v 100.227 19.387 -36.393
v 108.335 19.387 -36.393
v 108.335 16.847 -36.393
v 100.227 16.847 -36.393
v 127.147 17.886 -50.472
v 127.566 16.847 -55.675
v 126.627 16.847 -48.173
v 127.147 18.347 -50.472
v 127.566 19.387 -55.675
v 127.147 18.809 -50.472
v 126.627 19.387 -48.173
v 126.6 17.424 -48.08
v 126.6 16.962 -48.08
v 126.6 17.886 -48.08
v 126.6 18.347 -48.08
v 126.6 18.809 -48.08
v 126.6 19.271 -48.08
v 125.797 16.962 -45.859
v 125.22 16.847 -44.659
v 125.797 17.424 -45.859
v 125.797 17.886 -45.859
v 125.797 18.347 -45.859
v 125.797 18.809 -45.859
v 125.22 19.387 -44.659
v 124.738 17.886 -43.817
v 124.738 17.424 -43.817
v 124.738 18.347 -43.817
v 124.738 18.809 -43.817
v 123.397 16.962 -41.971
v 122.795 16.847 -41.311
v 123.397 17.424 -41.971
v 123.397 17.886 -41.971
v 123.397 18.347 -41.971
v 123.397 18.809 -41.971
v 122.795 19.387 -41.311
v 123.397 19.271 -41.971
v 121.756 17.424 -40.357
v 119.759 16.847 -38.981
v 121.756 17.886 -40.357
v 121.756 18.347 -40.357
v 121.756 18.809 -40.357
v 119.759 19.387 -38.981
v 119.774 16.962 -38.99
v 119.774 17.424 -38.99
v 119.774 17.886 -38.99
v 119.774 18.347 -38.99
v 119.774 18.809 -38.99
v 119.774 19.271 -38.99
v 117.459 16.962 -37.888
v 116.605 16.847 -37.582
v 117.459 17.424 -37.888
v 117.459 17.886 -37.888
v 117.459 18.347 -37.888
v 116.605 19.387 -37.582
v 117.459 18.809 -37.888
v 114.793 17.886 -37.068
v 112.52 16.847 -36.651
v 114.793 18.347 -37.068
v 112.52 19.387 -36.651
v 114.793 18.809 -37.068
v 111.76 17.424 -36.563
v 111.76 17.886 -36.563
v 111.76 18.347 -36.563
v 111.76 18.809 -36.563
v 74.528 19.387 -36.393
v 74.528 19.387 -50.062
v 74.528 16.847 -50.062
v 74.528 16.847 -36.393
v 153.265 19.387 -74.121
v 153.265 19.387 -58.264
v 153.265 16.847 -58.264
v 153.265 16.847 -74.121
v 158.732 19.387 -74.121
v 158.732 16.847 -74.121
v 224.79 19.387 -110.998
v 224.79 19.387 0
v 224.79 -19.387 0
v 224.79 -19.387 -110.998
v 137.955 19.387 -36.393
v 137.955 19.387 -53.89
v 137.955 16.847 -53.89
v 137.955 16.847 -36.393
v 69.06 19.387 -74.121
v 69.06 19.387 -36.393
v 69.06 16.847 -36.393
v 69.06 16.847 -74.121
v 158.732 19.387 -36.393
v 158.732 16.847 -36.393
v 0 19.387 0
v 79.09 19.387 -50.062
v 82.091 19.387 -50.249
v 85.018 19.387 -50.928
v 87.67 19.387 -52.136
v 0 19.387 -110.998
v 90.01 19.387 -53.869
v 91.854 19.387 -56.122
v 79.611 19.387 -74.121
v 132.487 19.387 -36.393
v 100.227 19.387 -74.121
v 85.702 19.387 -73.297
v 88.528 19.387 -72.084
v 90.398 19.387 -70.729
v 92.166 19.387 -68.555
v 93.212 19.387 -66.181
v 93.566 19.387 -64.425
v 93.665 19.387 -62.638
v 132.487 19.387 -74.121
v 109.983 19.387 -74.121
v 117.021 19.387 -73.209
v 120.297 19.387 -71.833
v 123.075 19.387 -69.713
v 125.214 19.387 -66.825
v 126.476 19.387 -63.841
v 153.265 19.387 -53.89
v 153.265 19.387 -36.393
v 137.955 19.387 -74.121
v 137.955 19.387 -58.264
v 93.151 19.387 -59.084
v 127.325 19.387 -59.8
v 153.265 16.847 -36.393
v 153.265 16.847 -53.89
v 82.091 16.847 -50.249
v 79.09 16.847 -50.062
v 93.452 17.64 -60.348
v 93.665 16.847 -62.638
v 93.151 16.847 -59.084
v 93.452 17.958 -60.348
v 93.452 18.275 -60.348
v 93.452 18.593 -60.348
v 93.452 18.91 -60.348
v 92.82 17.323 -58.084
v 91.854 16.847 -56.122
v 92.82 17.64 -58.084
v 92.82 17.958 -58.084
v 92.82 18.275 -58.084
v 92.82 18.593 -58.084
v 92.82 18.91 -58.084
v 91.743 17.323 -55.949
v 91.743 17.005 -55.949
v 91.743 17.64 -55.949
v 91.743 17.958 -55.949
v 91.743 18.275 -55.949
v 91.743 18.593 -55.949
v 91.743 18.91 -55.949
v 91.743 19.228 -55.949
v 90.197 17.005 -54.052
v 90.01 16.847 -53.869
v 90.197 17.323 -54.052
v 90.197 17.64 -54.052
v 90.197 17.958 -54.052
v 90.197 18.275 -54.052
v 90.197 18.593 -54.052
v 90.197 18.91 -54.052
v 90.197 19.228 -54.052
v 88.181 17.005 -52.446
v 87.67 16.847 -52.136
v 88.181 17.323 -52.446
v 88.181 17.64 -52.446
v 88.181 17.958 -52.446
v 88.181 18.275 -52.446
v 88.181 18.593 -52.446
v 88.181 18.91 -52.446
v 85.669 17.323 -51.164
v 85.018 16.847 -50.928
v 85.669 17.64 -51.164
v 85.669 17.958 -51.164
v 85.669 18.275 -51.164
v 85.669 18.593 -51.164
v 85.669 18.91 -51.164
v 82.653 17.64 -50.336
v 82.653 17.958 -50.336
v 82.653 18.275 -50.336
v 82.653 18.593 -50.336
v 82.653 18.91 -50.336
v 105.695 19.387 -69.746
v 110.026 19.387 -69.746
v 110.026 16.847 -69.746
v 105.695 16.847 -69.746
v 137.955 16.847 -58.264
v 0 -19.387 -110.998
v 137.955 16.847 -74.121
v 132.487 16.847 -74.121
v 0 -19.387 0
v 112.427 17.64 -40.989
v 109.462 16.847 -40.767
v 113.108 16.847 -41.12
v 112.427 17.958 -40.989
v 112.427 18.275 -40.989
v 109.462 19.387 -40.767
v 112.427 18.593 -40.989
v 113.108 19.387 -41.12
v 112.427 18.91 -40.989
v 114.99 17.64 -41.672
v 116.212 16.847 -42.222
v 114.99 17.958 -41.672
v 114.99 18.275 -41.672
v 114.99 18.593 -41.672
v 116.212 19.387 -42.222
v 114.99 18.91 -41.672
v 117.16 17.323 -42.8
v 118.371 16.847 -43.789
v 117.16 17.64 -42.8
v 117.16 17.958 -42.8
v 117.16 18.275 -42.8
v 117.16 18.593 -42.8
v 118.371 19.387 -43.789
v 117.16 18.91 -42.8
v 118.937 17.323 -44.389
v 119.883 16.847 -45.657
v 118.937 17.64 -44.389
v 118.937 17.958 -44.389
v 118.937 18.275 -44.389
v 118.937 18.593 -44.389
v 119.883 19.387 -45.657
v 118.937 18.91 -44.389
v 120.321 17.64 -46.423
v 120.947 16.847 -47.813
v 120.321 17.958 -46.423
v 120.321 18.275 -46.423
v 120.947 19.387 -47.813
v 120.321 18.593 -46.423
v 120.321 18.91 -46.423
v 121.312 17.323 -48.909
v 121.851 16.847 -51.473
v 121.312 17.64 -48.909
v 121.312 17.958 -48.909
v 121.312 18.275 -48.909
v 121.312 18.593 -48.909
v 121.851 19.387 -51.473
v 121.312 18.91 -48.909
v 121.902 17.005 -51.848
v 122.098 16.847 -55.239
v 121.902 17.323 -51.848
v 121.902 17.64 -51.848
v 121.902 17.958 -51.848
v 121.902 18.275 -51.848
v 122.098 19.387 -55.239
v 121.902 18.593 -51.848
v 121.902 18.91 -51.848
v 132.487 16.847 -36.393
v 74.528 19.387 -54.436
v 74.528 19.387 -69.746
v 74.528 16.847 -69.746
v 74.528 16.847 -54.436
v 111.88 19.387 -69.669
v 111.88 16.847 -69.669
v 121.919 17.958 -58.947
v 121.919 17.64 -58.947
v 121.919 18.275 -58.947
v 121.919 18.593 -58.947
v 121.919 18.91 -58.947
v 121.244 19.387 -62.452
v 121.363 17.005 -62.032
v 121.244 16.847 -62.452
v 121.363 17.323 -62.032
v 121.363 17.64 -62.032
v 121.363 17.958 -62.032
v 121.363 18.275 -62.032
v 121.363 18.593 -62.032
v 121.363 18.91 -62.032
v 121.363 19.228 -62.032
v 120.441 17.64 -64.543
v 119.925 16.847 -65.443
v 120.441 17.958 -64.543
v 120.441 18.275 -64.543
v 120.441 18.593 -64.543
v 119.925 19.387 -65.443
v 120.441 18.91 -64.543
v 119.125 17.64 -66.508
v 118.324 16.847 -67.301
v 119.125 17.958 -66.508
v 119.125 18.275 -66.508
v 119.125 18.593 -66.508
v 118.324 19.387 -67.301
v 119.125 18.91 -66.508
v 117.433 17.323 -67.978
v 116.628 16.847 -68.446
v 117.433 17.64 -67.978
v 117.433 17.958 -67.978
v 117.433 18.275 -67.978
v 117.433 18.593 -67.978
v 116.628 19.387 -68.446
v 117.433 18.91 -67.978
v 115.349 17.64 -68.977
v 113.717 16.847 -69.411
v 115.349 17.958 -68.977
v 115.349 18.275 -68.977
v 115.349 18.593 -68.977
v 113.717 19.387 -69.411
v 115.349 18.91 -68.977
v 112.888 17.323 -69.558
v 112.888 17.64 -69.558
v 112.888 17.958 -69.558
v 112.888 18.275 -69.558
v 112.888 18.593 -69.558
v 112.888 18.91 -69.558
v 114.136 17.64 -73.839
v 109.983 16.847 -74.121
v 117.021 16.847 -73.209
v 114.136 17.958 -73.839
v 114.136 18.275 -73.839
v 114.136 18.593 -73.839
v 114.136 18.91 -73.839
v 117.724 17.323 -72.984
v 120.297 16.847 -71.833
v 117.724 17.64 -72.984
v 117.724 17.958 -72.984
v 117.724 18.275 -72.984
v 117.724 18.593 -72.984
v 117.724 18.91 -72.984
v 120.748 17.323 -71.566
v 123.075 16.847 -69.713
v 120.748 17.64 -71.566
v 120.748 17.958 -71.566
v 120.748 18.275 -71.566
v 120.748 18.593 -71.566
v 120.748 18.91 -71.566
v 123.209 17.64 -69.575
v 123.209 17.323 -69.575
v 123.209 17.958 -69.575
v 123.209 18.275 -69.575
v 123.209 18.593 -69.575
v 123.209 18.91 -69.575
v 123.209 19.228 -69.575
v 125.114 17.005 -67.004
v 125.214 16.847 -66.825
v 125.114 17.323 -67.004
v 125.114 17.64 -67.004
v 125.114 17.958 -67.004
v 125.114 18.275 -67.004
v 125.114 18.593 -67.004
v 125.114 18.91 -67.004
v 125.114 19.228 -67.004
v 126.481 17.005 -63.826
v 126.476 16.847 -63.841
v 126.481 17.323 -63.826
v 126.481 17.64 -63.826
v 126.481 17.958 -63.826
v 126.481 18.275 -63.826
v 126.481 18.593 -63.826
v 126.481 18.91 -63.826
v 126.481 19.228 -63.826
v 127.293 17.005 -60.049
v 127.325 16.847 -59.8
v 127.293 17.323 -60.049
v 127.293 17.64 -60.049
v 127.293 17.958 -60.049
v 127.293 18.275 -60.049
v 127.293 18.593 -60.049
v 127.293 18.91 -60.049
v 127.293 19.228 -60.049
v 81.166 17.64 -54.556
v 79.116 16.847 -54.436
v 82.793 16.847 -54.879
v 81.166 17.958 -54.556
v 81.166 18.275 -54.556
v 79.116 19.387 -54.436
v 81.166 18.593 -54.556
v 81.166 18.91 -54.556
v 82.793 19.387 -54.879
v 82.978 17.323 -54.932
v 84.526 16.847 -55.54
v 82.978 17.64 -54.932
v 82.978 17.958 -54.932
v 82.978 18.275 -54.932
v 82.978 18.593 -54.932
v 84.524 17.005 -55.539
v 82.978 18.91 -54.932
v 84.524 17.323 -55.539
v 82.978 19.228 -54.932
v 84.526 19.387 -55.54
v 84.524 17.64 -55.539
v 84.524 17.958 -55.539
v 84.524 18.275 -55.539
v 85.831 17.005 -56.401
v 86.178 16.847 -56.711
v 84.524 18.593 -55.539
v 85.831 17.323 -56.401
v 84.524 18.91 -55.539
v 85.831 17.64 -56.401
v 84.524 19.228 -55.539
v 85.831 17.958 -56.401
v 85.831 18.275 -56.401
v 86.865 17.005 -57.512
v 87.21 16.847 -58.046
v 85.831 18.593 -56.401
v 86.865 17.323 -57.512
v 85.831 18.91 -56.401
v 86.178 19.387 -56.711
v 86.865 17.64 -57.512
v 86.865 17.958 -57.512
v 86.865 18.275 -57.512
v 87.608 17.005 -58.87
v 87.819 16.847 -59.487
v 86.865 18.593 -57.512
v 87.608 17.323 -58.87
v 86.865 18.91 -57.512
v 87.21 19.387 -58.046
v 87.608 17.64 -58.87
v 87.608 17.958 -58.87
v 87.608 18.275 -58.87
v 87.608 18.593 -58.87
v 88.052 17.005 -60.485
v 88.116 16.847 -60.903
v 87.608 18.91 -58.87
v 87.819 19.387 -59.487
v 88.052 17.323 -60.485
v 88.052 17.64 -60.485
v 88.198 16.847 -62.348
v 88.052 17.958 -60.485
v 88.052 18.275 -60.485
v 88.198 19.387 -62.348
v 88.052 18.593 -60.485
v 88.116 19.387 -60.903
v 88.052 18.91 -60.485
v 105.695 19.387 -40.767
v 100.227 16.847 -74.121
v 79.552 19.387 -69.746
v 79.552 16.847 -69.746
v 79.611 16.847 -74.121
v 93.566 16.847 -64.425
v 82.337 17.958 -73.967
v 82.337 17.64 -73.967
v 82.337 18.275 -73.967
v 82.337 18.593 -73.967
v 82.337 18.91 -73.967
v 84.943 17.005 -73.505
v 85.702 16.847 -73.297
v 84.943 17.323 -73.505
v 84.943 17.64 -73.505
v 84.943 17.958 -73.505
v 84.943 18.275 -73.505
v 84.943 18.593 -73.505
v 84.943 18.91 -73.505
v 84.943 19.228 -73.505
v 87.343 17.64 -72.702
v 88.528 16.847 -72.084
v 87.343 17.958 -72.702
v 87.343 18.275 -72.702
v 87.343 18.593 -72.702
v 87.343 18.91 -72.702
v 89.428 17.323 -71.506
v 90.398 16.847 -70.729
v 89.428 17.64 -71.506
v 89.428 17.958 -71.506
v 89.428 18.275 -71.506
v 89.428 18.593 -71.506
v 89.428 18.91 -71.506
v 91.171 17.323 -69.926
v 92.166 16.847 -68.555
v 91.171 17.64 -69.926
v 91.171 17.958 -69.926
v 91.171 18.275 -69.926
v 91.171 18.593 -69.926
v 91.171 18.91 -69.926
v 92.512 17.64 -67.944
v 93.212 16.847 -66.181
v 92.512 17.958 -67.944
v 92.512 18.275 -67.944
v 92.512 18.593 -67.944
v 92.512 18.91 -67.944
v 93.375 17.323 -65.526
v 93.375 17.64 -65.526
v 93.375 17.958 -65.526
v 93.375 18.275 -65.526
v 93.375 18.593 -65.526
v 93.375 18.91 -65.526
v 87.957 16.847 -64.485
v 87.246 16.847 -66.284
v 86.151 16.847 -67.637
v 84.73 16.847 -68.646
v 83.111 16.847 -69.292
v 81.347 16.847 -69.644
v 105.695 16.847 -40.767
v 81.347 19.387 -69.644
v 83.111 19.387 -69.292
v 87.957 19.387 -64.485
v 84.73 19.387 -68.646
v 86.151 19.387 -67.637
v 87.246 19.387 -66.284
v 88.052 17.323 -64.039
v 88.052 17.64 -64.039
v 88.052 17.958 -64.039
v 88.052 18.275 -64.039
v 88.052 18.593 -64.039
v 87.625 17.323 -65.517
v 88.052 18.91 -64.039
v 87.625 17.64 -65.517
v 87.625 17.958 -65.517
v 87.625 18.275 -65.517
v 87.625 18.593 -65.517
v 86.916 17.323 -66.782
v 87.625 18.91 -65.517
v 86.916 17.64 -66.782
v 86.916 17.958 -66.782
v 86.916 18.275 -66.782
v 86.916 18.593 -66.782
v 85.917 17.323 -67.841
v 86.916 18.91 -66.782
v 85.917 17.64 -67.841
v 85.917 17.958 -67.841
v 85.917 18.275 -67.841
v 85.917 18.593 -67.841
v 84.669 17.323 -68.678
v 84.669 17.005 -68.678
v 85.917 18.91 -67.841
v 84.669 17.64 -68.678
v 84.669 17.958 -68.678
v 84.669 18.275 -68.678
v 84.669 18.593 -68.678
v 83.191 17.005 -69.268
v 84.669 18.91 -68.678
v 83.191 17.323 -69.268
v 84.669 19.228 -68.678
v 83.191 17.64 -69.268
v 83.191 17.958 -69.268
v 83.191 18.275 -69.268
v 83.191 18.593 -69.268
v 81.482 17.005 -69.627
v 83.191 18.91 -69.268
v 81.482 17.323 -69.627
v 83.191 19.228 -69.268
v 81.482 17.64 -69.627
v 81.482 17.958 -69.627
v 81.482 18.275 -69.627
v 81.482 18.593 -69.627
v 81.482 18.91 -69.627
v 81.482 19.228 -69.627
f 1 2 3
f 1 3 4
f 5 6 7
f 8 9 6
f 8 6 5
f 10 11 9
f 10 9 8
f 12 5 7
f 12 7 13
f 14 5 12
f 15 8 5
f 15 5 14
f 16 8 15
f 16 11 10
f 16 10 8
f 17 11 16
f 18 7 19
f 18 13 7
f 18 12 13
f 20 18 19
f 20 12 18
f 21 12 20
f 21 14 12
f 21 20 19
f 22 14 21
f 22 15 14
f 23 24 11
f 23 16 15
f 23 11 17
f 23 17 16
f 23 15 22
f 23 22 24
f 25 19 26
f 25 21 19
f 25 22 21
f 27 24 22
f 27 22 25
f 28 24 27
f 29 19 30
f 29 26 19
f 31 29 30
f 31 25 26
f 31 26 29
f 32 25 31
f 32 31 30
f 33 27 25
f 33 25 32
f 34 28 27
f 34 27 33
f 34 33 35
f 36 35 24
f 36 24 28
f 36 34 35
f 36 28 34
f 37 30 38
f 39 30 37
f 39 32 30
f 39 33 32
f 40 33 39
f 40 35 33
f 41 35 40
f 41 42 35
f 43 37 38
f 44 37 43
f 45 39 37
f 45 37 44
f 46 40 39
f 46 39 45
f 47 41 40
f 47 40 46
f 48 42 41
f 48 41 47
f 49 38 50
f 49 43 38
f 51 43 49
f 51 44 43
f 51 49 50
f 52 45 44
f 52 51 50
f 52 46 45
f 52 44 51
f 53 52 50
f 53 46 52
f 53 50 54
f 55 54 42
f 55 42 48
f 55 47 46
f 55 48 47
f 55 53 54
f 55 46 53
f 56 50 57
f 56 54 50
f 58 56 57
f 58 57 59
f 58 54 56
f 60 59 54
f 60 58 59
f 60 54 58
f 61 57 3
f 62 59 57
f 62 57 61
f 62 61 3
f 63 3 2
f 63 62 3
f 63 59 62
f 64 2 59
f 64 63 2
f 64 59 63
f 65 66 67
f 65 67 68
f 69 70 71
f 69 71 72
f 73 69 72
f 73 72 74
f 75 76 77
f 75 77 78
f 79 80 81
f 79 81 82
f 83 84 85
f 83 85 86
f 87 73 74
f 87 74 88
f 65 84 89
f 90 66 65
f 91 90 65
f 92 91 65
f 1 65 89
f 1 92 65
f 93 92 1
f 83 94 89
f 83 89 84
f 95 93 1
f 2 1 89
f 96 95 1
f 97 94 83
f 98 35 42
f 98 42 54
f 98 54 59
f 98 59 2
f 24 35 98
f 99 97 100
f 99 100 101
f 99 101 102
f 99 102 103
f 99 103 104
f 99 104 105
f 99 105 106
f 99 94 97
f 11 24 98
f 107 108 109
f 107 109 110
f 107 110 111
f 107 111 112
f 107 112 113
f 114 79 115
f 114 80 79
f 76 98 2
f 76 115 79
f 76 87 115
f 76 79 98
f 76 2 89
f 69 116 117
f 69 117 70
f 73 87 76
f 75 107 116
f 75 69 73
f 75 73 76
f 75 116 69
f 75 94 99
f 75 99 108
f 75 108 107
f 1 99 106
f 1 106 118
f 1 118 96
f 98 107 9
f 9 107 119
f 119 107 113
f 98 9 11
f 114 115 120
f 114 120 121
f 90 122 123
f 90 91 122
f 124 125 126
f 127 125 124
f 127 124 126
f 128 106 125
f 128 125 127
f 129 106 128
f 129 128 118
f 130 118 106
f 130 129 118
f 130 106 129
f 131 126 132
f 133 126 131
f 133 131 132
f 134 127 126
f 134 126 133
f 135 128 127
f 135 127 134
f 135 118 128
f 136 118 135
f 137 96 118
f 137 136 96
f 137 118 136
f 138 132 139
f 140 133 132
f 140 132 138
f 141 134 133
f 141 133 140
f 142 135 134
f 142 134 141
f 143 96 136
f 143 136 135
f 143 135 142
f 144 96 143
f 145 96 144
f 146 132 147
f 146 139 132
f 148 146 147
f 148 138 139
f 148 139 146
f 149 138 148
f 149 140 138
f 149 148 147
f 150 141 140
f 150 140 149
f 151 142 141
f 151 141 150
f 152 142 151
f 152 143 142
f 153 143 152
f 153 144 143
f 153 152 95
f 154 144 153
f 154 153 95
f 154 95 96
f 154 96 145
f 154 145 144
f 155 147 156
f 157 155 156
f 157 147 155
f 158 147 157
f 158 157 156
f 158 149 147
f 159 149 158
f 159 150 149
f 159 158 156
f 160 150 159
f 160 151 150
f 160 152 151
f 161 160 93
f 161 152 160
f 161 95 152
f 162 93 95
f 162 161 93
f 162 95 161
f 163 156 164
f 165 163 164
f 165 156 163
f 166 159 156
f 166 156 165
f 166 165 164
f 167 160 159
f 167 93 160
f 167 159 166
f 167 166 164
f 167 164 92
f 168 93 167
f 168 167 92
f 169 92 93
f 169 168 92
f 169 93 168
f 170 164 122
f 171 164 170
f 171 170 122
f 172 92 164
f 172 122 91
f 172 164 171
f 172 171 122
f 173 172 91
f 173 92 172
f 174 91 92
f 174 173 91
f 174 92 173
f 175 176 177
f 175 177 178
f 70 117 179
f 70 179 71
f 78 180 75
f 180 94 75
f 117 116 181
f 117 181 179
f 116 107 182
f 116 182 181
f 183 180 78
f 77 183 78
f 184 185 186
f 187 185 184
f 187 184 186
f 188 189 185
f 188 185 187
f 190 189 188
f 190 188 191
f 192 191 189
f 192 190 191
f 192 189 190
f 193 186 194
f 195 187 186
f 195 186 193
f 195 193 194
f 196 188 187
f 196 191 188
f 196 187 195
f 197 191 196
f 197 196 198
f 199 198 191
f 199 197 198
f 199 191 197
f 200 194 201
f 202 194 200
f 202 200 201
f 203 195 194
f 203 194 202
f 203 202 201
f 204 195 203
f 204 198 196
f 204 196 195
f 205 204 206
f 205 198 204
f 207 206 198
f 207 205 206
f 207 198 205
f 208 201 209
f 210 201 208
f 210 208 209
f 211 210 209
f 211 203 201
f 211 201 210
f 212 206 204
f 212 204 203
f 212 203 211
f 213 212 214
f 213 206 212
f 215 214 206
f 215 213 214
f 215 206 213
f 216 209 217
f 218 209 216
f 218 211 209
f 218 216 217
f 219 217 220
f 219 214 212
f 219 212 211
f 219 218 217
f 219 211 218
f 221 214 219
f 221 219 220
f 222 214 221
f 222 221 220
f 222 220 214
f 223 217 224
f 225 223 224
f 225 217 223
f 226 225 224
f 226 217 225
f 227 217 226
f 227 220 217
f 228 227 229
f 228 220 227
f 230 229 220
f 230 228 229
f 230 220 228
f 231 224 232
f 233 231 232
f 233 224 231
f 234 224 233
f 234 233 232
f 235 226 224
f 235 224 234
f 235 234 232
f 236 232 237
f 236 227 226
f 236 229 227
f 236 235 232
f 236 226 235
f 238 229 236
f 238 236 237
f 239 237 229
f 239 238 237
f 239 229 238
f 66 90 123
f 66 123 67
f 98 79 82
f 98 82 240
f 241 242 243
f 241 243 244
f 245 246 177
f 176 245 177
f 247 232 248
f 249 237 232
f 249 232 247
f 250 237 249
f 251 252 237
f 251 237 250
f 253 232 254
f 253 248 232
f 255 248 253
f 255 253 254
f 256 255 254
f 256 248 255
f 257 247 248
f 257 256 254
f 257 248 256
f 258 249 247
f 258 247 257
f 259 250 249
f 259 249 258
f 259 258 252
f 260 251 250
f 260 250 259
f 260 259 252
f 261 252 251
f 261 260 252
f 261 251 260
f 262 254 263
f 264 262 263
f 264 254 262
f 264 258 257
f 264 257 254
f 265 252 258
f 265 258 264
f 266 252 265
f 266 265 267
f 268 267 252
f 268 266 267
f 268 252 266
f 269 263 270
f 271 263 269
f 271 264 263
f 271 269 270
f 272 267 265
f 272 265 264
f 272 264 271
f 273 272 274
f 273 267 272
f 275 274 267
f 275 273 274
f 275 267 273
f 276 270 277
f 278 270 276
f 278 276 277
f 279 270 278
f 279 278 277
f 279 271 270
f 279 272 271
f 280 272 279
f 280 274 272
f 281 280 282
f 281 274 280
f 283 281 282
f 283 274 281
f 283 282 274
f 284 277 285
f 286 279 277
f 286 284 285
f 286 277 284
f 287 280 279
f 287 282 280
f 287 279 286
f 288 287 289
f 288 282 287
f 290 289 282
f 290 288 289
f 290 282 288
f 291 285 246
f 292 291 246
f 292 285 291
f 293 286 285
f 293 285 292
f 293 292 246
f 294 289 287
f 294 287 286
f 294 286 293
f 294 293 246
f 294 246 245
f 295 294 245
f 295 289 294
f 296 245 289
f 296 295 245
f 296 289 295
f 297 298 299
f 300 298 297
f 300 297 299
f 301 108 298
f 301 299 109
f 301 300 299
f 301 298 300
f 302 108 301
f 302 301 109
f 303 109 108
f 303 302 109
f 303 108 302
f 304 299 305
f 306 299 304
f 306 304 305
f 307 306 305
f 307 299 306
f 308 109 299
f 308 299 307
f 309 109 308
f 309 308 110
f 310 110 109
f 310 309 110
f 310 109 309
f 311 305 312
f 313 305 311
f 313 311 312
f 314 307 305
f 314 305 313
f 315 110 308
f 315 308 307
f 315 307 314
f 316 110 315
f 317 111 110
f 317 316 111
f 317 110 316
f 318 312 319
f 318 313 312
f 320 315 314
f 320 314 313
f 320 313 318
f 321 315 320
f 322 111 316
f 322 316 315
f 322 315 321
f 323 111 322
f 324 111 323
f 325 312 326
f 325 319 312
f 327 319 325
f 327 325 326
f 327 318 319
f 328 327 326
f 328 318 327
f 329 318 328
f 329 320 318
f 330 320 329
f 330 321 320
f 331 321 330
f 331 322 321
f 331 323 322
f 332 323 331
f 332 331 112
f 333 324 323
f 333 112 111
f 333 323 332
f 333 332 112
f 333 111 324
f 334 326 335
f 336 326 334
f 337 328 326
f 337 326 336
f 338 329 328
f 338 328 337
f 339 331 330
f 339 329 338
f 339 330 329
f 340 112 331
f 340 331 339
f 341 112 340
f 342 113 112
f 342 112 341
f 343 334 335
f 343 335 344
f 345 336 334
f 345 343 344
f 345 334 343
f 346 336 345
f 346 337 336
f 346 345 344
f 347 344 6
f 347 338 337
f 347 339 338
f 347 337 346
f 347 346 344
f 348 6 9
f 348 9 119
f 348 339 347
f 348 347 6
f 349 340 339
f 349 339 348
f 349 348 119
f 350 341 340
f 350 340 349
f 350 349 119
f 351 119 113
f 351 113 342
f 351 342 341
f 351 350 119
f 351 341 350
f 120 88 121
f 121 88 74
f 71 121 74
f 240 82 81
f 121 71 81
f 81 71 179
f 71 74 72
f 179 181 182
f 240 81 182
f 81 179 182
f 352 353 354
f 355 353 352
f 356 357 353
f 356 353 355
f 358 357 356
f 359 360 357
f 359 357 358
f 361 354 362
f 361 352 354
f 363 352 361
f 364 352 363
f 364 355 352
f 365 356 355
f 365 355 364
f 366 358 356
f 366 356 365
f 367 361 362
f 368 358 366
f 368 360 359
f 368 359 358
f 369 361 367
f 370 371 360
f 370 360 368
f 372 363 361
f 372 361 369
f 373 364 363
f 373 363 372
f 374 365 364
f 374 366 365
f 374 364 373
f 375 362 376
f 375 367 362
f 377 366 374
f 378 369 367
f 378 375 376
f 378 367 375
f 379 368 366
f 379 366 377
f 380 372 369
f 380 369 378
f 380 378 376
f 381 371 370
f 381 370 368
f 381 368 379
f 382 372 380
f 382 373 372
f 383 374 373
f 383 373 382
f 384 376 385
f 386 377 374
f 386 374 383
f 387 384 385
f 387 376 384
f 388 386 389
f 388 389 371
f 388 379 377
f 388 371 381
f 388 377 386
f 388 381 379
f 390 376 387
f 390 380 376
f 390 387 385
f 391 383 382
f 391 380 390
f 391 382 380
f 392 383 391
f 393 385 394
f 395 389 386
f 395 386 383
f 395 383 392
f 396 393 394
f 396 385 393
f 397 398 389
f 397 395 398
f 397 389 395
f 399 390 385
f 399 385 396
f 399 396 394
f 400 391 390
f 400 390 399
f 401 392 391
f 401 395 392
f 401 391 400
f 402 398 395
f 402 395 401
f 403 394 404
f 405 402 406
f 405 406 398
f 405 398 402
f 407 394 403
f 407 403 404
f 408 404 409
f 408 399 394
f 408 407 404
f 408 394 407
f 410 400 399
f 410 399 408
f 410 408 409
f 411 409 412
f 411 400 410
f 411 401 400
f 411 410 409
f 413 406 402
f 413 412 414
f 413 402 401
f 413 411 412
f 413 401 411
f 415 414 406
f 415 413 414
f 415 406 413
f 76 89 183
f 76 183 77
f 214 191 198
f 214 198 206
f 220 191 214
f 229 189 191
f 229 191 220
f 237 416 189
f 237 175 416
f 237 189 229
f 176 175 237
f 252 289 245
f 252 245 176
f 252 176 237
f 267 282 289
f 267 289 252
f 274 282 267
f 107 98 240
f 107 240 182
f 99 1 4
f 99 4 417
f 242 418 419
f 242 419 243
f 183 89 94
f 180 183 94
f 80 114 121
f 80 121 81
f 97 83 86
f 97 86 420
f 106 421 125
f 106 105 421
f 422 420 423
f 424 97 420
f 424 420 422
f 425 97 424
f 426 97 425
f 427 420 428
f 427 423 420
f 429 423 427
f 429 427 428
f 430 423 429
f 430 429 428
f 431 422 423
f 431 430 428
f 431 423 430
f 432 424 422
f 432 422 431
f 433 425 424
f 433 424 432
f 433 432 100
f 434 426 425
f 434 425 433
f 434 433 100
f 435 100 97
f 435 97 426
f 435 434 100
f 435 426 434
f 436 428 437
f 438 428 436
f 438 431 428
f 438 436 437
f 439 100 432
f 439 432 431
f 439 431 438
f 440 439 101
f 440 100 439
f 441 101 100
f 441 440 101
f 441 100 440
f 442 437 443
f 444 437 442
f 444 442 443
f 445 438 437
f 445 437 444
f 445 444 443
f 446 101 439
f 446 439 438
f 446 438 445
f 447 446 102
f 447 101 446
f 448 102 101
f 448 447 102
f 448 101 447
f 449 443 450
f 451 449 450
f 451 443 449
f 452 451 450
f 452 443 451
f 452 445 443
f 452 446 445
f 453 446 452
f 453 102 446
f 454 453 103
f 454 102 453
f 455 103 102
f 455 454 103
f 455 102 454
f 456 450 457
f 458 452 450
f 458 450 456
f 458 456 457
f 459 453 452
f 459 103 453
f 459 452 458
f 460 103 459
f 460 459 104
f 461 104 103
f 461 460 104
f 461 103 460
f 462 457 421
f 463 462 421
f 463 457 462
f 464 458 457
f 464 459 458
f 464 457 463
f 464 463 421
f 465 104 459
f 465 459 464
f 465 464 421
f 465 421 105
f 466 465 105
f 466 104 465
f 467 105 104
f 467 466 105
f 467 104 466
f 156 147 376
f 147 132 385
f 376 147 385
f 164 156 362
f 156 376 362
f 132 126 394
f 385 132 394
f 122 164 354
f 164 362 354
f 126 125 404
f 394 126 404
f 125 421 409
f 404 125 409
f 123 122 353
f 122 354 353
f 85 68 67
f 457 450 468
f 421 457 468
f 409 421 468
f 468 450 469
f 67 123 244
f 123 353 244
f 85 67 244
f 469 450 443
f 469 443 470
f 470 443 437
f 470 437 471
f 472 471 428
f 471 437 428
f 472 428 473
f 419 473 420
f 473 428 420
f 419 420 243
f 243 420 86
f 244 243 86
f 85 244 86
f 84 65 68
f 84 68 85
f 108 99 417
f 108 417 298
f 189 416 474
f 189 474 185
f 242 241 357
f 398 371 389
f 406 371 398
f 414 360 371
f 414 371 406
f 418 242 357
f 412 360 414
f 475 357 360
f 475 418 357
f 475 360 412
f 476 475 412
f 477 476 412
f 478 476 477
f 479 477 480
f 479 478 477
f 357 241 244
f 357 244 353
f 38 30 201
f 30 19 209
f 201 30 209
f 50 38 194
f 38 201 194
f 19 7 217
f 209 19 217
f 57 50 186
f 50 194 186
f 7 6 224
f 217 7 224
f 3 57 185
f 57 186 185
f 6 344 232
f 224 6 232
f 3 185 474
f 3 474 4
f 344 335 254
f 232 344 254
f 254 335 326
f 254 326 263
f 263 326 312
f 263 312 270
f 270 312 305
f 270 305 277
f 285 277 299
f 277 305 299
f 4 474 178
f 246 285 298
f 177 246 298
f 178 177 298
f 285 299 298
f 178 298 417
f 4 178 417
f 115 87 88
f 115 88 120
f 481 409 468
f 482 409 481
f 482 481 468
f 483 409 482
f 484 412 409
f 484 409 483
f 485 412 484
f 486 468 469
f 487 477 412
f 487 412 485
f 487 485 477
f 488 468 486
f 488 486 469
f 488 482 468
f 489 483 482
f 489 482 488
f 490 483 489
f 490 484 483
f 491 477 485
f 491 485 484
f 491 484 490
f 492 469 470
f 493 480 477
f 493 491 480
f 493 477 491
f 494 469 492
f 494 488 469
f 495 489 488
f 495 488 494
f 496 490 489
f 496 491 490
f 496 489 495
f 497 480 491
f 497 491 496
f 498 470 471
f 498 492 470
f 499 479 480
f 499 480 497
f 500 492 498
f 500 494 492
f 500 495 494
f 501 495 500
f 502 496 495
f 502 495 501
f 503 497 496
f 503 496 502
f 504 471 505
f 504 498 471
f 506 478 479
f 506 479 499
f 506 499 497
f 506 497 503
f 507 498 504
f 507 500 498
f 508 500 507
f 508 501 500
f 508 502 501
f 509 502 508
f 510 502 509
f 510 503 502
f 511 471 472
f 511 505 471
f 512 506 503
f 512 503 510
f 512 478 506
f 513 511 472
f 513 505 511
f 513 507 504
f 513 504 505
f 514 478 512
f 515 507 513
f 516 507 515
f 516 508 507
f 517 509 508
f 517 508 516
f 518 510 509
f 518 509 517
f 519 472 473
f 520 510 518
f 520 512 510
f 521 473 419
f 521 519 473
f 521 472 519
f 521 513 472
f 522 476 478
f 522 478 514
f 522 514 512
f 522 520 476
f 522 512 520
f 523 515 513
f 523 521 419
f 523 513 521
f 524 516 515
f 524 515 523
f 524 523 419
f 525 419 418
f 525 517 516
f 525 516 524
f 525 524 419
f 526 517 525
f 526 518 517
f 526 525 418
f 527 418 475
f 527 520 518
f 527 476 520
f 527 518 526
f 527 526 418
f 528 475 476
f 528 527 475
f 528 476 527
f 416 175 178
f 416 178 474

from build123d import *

# Parameters (mm, degrees)
SKETCH1_W           = 224.79
SKETCH1_H           = 110.998
BOSS_EXTRUDE1_DEPTH = 19.38655
CUT_EXTRUDE1_DEPTH  = 2.54


with BuildPart() as part:
    # Sketch1 → Boss-Extrude1 (new, symmetric)
    with BuildSketch(Plane(origin=(0, 0, 0), x_dir=(1, 0, 0), z_dir=(0, 1, 0))):
        with Locations((112.395, 55.499)):
            Rectangle(SKETCH1_W, SKETCH1_H)
    extrude(amount=BOSS_EXTRUDE1_DEPTH, both=True)

    # Sketch2 → Cut-Extrude1 (cut)
    # profile 1 of 3: a face of its own
    with BuildSketch(Plane(origin=(0, 19.38655, 0), x_dir=(1, 0, 0), z_dir=(0, 1, 0))):
        with BuildLine():
            add(Edge.make_bspline(
                [(93.6654446, 62.638119725), (93.65621175, 62.255926888), (93.637663033, 61.488104777), (93.466421809, 60.341834085), (93.201255703, 59.201705874), (92.836997723, 58.075217304), (92.359286935, 56.979010165), (91.762331794, 55.932624231), (91.032595392, 54.955716054), (90.207106522, 54.027487516), (89.252652089, 53.179116743), (88.173798237, 52.414727304), (86.973600637, 51.734204765), (85.655660468, 51.128628725), (84.202701193, 50.653409294), (82.618753702, 50.300761726), (80.898189452, 50.099121533), (79.705954978, 50.07473573), (79.09029785, 50.062143162)],
                knots=[0, 0, 0, 0, 0.84837333, 1.704374698, 2.568122001, 3.446177459, 4.329841521, 5.219461111, 6.115085959, 7.03322926, 7.973947317, 8.94447037, 9.964314875, 11.034235969, 12.160282575, 13.352588404, 14.632904974, 16, 16, 16, 16], degree=3))
            Line((79.09029785, 50.062143162), (74.528088962, 50.062143162))
            Line((74.528088962, 50.062143162), (74.528088962, 36.39260342))
            Line((74.528088962, 36.39260342), (69.060273065, 36.39260342))
            Line((69.060273065, 36.39260342), (69.060273065, 74.120533108))
            Line((69.060273065, 74.120533108), (79.611449053, 74.120533108))
            add(Edge.make_bspline(
                [(79.611449053, 74.120533108), (80.070260309, 74.115673927), (80.980958213, 74.106028903), (82.329353652, 73.976911734), (83.651671763, 73.795021467), (84.937147693, 73.523102459), (86.171480276, 73.166358976), (87.344146306, 72.730911072), (88.422755699, 72.162952721), (89.43560104, 71.526521333), (90.368402205, 70.791840353), (91.189022047, 69.939252772), (91.912770344, 68.989458848), (92.539599198, 67.944691466), (93.055694596, 66.787250357), (93.402550005, 65.504823346), (93.635402669, 64.110350409), (93.655195832, 63.140369447), (93.6654446, 62.638119725)],
                knots=[0, 0, 0, 0, 1.071095419, 2.126025337, 3.160633674, 4.187194637, 5.191188192, 6.159546808, 7.102471747, 8.032359578, 8.950543616, 9.867691343, 10.788184798, 11.733733012, 12.707489344, 13.737062018, 14.82826569, 16, 16, 16, 16], degree=3))
        make_face()
        with BuildLine():
            add(Edge.make_bspline(
                [(88.197628703, 62.347642005), (88.192174404, 62.63850916), (88.18154377, 63.205420092), (88.067270065, 64.026417972), (87.887321266, 64.795998376), (87.642204989, 65.513494356), (87.324445545, 66.181041679), (86.9271256, 66.789508742), (86.462833318, 67.351595169), (85.92370252, 67.854044286), (85.320326107, 68.296325862), (84.670815804, 68.696121206), (83.954231053, 69.019190265), (83.180431142, 69.281086893), (82.353689397, 69.498799431), (81.465989989, 69.635809834), (80.527957319, 69.737538529), (79.882297045, 69.743319744), (79.551644817, 69.74628039)],
                knots=[0, 0, 0, 0, 1.07893025, 2.102875295, 3.069403633, 4.00867391, 4.911619206, 5.805799344, 6.69897942, 7.61127936, 8.532960211, 9.47193309, 10.436783978, 11.442898866, 12.50165651, 13.605056338, 14.773513735, 16, 16, 16, 16], degree=3))
            Line((79.551644817, 69.74628039), (74.528088962, 69.74628039))
            Line((74.528088962, 69.74628039), (74.528088962, 54.43639588))
            Line((74.528088962, 54.43639588), (79.115928237, 54.43639588))
            add(Edge.make_bspline(
                [(79.115928237, 54.43639588), (79.469215163, 54.444058583), (80.154049634, 54.458912469), (81.153694325, 54.542163566), (82.091850755, 54.691905292), (82.964265919, 54.917155421), (83.774695488, 55.18910777), (84.524586407, 55.521306188), (85.210072438, 55.925895812), (85.836535364, 56.387055958), (86.399655255, 56.909209561), (86.877940326, 57.506401351), (87.291847487, 58.157818385), (87.628287432, 58.875259995), (87.880108968, 59.657394144), (88.069138486, 60.497611643), (88.18153711, 61.401962584), (88.192147378, 62.025512532), (88.197628703, 62.347642005)],
                knots=[0, 0, 0, 0, 1.232805628, 2.389751021, 3.4973379, 4.54330244, 5.530003372, 6.477393866, 7.399377973, 8.301660217, 9.187431021, 10.070466494, 10.963674817, 11.874940633, 12.827061481, 13.825105319, 14.876436953, 16, 16, 16, 16], degree=3))
        make_face(mode=Mode.SUBTRACT)
    # profile 2 of 3: a face of its own
    with BuildSketch(Plane(origin=(0, 19.38655, 0), x_dir=(1, 0, 0), z_dir=(0, 1, 0))):
        with BuildLine():
            add(Edge.make_bspline(
                [(127.56590316, 55.675197919), (127.547617612, 54.78857119), (127.511689457, 53.046492477), (127.23969054, 50.905769989), (126.922569652, 49.262016243), (126.614411717, 48.087206761), (126.246431872, 46.950715858), (125.811824352, 45.860819894), (125.314265868, 44.812615172), (124.753130965, 43.8086857), (124.107420568, 42.863739226), (123.409082848, 41.959258432), (122.626828334, 41.117422828), (121.7596775, 40.338177311), (120.809466051, 39.618619159), (119.771337822, 38.967548349), (118.647283346, 38.391422091), (117.447711896, 37.861858683), (116.153140186, 37.424384305), (114.773384937, 37.046415803), (113.301688648, 36.744518404), (111.730514486, 36.548407326), (110.065508535, 36.414654635), (108.921503761, 36.400080642), (108.334569436, 36.39260342)],
                knots=[0, 0, 0, 0, 1.874627119, 3.68334034, 4.55511198, 5.414139205, 6.25033141, 7.080252411, 7.893905149, 8.703019486, 9.509911256, 10.312362027, 11.117881282, 11.936734267, 12.775179546, 13.635831221, 14.524848569, 15.444673208, 16.406604644, 17.411911457, 18.469143348, 19.580838344, 20.758843452, 22, 22, 22, 22], degree=3))
            Line((108.334569436, 36.39260342), (100.226823676, 36.39260342))
            Line((100.226823676, 36.39260342), (100.226823676, 74.120533108))
            Line((100.226823676, 74.120533108), (109.983457667, 74.120533108))
            add(Edge.make_bspline(
                [(109.983457667, 74.120533108), (110.698796565, 74.108775888), (112.087312401, 74.085954417), (114.099407103, 73.871359676), (115.971010991, 73.513186255), (117.705932553, 73.024742171), (119.296694788, 72.37897733), (120.753078111, 71.603929555), (122.063935524, 70.672214529), (123.234870408, 69.595919293), (124.268375898, 68.375042443), (125.15212849, 66.998343044), (125.905974417, 65.477332321), (126.520334079, 63.804439371), (126.984079723, 61.979297568), (127.323005556, 60.011417912), (127.529971236, 57.892365797), (127.553664927, 56.430354144), (127.56590316, 55.675197919)],
                knots=[0, 0, 0, 0, 1.17177347, 2.274482801, 3.310388109, 4.291013938, 5.222472681, 6.118087065, 6.988127256, 7.850034114, 8.717518086, 9.601485366, 10.523818561, 11.493740021, 12.515690363, 13.604990885, 14.762933224, 16, 16, 16, 16], degree=3))
        make_face()
        with BuildLine():
            add(Edge.make_bspline(
                [(122.098087263, 55.239481339), (122.091167759, 55.883338842), (122.07786261, 57.121378364), (121.941863816, 58.899207539), (121.714490077, 60.523833747), (121.395141619, 62.00003254), (120.973701982, 63.330931753), (120.478179626, 64.534888844), (119.856705316, 65.588603714), (119.150728012, 66.521049001), (118.340699821, 67.317635038), (117.439068976, 68.005524695), (116.438452675, 68.568612468), (115.337592989, 69.003716428), (114.147410598, 69.331977904), (112.863376849, 69.585308184), (111.475458259, 69.713259964), (110.519060263, 69.735050507), (110.026174979, 69.74628039)],
                knots=[0, 0, 0, 0, 1.413547595, 2.71803587, 3.911871408, 5.013341294, 6.029850817, 6.974090411, 7.865305992, 8.708270035, 9.535123508, 10.351794371, 11.191784495, 12.047569406, 12.944296091, 13.8996306, 14.91756238, 16, 16, 16, 16], degree=3))
            Line((110.026174979, 69.74628039), (105.694639573, 69.74628039))
            Line((105.694639573, 69.74628039), (105.694639573, 40.766856138))
            Line((105.694639573, 40.766856138), (109.462306464, 40.766856138))
            add(Edge.make_bspline(
                [(109.462306464, 40.766856138), (109.972390662, 40.779628967), (110.963897054, 40.804456912), (112.404673192, 40.959074575), (113.741396992, 41.254449715), (114.982492322, 41.645412228), (116.128283102, 42.146846942), (117.168651881, 42.778873861), (118.119824521, 43.514260641), (118.95603885, 44.379608434), (119.710984868, 45.341779056), (120.348177326, 46.429272224), (120.897700383, 47.621563924), (121.340339899, 48.927882581), (121.678563879, 50.347150333), (121.924720399, 51.877582623), (122.068484344, 53.522343822), (122.088017719, 54.655390557), (122.098087263, 55.239481339)],
                knots=[0, 0, 0, 0, 1.112402768, 2.162298815, 3.153767855, 4.092494856, 4.996014567, 5.873553179, 6.740614794, 7.610074679, 8.4907496, 9.401305331, 10.351566166, 11.349161427, 12.403455731, 13.529502205, 14.72644707, 16, 16, 16, 16], degree=3))
        make_face(mode=Mode.SUBTRACT)
    # profile 3 of 3: a face of its own
    with BuildSketch(Plane(origin=(0, 19.38655, 0), x_dir=(1, 0, 0), z_dir=(0, 1, 0))):
        Polygon((158.732453771, 36.39260342), (153.264637875, 36.39260342), (153.264637875, 53.88961429), (137.954753364, 53.88961429), (137.954753364, 36.39260342), (132.486937467, 36.39260342), (132.486937467, 74.120533108), (137.954753364, 74.120533108), (137.954753364, 58.263867007), (153.264637875, 58.263867007), (153.264637875, 74.120533108), (158.732453771, 74.120533108), align=None)
    extrude(amount=-CUT_EXTRUDE1_DEPTH, mode=Mode.SUBTRACT)


solid = part.part
